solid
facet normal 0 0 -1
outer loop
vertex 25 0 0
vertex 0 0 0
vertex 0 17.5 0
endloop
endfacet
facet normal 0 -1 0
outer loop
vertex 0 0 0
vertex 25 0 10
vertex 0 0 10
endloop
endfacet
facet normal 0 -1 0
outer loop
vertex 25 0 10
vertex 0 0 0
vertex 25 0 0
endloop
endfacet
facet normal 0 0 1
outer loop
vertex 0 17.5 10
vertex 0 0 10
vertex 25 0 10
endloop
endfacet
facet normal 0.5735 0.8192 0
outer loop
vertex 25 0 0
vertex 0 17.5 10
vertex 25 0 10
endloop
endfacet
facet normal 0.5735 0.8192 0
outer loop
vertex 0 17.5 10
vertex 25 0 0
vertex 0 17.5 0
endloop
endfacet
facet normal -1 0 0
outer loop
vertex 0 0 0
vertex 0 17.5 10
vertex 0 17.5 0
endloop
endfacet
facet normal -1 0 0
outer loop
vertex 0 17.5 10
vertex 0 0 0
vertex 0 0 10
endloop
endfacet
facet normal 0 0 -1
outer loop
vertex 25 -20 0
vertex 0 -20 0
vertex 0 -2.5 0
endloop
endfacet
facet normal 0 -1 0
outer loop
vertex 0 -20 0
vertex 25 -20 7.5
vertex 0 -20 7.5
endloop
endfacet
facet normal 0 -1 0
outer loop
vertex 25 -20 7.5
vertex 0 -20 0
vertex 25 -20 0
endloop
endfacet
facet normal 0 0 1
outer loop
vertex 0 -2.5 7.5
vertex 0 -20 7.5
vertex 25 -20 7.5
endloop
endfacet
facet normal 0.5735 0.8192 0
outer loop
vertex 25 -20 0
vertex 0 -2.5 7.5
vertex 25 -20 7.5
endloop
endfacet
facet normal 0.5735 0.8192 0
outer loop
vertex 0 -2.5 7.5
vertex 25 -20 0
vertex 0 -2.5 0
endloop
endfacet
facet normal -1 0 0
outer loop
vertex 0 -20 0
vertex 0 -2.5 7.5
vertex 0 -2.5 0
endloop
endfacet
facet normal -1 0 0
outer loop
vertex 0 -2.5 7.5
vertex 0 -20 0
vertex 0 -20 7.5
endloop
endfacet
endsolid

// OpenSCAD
module rettvinklet_trekant(base=25, height=17.5) {
    polygon(points=[ [0,0], [base,0], [0,height] ]);
}

linear_extrude(10) {
    rettvinklet_trekant();
}

translate([0,-20]) {
    linear_extrude(7.5) rettvinklet_trekant();
}
